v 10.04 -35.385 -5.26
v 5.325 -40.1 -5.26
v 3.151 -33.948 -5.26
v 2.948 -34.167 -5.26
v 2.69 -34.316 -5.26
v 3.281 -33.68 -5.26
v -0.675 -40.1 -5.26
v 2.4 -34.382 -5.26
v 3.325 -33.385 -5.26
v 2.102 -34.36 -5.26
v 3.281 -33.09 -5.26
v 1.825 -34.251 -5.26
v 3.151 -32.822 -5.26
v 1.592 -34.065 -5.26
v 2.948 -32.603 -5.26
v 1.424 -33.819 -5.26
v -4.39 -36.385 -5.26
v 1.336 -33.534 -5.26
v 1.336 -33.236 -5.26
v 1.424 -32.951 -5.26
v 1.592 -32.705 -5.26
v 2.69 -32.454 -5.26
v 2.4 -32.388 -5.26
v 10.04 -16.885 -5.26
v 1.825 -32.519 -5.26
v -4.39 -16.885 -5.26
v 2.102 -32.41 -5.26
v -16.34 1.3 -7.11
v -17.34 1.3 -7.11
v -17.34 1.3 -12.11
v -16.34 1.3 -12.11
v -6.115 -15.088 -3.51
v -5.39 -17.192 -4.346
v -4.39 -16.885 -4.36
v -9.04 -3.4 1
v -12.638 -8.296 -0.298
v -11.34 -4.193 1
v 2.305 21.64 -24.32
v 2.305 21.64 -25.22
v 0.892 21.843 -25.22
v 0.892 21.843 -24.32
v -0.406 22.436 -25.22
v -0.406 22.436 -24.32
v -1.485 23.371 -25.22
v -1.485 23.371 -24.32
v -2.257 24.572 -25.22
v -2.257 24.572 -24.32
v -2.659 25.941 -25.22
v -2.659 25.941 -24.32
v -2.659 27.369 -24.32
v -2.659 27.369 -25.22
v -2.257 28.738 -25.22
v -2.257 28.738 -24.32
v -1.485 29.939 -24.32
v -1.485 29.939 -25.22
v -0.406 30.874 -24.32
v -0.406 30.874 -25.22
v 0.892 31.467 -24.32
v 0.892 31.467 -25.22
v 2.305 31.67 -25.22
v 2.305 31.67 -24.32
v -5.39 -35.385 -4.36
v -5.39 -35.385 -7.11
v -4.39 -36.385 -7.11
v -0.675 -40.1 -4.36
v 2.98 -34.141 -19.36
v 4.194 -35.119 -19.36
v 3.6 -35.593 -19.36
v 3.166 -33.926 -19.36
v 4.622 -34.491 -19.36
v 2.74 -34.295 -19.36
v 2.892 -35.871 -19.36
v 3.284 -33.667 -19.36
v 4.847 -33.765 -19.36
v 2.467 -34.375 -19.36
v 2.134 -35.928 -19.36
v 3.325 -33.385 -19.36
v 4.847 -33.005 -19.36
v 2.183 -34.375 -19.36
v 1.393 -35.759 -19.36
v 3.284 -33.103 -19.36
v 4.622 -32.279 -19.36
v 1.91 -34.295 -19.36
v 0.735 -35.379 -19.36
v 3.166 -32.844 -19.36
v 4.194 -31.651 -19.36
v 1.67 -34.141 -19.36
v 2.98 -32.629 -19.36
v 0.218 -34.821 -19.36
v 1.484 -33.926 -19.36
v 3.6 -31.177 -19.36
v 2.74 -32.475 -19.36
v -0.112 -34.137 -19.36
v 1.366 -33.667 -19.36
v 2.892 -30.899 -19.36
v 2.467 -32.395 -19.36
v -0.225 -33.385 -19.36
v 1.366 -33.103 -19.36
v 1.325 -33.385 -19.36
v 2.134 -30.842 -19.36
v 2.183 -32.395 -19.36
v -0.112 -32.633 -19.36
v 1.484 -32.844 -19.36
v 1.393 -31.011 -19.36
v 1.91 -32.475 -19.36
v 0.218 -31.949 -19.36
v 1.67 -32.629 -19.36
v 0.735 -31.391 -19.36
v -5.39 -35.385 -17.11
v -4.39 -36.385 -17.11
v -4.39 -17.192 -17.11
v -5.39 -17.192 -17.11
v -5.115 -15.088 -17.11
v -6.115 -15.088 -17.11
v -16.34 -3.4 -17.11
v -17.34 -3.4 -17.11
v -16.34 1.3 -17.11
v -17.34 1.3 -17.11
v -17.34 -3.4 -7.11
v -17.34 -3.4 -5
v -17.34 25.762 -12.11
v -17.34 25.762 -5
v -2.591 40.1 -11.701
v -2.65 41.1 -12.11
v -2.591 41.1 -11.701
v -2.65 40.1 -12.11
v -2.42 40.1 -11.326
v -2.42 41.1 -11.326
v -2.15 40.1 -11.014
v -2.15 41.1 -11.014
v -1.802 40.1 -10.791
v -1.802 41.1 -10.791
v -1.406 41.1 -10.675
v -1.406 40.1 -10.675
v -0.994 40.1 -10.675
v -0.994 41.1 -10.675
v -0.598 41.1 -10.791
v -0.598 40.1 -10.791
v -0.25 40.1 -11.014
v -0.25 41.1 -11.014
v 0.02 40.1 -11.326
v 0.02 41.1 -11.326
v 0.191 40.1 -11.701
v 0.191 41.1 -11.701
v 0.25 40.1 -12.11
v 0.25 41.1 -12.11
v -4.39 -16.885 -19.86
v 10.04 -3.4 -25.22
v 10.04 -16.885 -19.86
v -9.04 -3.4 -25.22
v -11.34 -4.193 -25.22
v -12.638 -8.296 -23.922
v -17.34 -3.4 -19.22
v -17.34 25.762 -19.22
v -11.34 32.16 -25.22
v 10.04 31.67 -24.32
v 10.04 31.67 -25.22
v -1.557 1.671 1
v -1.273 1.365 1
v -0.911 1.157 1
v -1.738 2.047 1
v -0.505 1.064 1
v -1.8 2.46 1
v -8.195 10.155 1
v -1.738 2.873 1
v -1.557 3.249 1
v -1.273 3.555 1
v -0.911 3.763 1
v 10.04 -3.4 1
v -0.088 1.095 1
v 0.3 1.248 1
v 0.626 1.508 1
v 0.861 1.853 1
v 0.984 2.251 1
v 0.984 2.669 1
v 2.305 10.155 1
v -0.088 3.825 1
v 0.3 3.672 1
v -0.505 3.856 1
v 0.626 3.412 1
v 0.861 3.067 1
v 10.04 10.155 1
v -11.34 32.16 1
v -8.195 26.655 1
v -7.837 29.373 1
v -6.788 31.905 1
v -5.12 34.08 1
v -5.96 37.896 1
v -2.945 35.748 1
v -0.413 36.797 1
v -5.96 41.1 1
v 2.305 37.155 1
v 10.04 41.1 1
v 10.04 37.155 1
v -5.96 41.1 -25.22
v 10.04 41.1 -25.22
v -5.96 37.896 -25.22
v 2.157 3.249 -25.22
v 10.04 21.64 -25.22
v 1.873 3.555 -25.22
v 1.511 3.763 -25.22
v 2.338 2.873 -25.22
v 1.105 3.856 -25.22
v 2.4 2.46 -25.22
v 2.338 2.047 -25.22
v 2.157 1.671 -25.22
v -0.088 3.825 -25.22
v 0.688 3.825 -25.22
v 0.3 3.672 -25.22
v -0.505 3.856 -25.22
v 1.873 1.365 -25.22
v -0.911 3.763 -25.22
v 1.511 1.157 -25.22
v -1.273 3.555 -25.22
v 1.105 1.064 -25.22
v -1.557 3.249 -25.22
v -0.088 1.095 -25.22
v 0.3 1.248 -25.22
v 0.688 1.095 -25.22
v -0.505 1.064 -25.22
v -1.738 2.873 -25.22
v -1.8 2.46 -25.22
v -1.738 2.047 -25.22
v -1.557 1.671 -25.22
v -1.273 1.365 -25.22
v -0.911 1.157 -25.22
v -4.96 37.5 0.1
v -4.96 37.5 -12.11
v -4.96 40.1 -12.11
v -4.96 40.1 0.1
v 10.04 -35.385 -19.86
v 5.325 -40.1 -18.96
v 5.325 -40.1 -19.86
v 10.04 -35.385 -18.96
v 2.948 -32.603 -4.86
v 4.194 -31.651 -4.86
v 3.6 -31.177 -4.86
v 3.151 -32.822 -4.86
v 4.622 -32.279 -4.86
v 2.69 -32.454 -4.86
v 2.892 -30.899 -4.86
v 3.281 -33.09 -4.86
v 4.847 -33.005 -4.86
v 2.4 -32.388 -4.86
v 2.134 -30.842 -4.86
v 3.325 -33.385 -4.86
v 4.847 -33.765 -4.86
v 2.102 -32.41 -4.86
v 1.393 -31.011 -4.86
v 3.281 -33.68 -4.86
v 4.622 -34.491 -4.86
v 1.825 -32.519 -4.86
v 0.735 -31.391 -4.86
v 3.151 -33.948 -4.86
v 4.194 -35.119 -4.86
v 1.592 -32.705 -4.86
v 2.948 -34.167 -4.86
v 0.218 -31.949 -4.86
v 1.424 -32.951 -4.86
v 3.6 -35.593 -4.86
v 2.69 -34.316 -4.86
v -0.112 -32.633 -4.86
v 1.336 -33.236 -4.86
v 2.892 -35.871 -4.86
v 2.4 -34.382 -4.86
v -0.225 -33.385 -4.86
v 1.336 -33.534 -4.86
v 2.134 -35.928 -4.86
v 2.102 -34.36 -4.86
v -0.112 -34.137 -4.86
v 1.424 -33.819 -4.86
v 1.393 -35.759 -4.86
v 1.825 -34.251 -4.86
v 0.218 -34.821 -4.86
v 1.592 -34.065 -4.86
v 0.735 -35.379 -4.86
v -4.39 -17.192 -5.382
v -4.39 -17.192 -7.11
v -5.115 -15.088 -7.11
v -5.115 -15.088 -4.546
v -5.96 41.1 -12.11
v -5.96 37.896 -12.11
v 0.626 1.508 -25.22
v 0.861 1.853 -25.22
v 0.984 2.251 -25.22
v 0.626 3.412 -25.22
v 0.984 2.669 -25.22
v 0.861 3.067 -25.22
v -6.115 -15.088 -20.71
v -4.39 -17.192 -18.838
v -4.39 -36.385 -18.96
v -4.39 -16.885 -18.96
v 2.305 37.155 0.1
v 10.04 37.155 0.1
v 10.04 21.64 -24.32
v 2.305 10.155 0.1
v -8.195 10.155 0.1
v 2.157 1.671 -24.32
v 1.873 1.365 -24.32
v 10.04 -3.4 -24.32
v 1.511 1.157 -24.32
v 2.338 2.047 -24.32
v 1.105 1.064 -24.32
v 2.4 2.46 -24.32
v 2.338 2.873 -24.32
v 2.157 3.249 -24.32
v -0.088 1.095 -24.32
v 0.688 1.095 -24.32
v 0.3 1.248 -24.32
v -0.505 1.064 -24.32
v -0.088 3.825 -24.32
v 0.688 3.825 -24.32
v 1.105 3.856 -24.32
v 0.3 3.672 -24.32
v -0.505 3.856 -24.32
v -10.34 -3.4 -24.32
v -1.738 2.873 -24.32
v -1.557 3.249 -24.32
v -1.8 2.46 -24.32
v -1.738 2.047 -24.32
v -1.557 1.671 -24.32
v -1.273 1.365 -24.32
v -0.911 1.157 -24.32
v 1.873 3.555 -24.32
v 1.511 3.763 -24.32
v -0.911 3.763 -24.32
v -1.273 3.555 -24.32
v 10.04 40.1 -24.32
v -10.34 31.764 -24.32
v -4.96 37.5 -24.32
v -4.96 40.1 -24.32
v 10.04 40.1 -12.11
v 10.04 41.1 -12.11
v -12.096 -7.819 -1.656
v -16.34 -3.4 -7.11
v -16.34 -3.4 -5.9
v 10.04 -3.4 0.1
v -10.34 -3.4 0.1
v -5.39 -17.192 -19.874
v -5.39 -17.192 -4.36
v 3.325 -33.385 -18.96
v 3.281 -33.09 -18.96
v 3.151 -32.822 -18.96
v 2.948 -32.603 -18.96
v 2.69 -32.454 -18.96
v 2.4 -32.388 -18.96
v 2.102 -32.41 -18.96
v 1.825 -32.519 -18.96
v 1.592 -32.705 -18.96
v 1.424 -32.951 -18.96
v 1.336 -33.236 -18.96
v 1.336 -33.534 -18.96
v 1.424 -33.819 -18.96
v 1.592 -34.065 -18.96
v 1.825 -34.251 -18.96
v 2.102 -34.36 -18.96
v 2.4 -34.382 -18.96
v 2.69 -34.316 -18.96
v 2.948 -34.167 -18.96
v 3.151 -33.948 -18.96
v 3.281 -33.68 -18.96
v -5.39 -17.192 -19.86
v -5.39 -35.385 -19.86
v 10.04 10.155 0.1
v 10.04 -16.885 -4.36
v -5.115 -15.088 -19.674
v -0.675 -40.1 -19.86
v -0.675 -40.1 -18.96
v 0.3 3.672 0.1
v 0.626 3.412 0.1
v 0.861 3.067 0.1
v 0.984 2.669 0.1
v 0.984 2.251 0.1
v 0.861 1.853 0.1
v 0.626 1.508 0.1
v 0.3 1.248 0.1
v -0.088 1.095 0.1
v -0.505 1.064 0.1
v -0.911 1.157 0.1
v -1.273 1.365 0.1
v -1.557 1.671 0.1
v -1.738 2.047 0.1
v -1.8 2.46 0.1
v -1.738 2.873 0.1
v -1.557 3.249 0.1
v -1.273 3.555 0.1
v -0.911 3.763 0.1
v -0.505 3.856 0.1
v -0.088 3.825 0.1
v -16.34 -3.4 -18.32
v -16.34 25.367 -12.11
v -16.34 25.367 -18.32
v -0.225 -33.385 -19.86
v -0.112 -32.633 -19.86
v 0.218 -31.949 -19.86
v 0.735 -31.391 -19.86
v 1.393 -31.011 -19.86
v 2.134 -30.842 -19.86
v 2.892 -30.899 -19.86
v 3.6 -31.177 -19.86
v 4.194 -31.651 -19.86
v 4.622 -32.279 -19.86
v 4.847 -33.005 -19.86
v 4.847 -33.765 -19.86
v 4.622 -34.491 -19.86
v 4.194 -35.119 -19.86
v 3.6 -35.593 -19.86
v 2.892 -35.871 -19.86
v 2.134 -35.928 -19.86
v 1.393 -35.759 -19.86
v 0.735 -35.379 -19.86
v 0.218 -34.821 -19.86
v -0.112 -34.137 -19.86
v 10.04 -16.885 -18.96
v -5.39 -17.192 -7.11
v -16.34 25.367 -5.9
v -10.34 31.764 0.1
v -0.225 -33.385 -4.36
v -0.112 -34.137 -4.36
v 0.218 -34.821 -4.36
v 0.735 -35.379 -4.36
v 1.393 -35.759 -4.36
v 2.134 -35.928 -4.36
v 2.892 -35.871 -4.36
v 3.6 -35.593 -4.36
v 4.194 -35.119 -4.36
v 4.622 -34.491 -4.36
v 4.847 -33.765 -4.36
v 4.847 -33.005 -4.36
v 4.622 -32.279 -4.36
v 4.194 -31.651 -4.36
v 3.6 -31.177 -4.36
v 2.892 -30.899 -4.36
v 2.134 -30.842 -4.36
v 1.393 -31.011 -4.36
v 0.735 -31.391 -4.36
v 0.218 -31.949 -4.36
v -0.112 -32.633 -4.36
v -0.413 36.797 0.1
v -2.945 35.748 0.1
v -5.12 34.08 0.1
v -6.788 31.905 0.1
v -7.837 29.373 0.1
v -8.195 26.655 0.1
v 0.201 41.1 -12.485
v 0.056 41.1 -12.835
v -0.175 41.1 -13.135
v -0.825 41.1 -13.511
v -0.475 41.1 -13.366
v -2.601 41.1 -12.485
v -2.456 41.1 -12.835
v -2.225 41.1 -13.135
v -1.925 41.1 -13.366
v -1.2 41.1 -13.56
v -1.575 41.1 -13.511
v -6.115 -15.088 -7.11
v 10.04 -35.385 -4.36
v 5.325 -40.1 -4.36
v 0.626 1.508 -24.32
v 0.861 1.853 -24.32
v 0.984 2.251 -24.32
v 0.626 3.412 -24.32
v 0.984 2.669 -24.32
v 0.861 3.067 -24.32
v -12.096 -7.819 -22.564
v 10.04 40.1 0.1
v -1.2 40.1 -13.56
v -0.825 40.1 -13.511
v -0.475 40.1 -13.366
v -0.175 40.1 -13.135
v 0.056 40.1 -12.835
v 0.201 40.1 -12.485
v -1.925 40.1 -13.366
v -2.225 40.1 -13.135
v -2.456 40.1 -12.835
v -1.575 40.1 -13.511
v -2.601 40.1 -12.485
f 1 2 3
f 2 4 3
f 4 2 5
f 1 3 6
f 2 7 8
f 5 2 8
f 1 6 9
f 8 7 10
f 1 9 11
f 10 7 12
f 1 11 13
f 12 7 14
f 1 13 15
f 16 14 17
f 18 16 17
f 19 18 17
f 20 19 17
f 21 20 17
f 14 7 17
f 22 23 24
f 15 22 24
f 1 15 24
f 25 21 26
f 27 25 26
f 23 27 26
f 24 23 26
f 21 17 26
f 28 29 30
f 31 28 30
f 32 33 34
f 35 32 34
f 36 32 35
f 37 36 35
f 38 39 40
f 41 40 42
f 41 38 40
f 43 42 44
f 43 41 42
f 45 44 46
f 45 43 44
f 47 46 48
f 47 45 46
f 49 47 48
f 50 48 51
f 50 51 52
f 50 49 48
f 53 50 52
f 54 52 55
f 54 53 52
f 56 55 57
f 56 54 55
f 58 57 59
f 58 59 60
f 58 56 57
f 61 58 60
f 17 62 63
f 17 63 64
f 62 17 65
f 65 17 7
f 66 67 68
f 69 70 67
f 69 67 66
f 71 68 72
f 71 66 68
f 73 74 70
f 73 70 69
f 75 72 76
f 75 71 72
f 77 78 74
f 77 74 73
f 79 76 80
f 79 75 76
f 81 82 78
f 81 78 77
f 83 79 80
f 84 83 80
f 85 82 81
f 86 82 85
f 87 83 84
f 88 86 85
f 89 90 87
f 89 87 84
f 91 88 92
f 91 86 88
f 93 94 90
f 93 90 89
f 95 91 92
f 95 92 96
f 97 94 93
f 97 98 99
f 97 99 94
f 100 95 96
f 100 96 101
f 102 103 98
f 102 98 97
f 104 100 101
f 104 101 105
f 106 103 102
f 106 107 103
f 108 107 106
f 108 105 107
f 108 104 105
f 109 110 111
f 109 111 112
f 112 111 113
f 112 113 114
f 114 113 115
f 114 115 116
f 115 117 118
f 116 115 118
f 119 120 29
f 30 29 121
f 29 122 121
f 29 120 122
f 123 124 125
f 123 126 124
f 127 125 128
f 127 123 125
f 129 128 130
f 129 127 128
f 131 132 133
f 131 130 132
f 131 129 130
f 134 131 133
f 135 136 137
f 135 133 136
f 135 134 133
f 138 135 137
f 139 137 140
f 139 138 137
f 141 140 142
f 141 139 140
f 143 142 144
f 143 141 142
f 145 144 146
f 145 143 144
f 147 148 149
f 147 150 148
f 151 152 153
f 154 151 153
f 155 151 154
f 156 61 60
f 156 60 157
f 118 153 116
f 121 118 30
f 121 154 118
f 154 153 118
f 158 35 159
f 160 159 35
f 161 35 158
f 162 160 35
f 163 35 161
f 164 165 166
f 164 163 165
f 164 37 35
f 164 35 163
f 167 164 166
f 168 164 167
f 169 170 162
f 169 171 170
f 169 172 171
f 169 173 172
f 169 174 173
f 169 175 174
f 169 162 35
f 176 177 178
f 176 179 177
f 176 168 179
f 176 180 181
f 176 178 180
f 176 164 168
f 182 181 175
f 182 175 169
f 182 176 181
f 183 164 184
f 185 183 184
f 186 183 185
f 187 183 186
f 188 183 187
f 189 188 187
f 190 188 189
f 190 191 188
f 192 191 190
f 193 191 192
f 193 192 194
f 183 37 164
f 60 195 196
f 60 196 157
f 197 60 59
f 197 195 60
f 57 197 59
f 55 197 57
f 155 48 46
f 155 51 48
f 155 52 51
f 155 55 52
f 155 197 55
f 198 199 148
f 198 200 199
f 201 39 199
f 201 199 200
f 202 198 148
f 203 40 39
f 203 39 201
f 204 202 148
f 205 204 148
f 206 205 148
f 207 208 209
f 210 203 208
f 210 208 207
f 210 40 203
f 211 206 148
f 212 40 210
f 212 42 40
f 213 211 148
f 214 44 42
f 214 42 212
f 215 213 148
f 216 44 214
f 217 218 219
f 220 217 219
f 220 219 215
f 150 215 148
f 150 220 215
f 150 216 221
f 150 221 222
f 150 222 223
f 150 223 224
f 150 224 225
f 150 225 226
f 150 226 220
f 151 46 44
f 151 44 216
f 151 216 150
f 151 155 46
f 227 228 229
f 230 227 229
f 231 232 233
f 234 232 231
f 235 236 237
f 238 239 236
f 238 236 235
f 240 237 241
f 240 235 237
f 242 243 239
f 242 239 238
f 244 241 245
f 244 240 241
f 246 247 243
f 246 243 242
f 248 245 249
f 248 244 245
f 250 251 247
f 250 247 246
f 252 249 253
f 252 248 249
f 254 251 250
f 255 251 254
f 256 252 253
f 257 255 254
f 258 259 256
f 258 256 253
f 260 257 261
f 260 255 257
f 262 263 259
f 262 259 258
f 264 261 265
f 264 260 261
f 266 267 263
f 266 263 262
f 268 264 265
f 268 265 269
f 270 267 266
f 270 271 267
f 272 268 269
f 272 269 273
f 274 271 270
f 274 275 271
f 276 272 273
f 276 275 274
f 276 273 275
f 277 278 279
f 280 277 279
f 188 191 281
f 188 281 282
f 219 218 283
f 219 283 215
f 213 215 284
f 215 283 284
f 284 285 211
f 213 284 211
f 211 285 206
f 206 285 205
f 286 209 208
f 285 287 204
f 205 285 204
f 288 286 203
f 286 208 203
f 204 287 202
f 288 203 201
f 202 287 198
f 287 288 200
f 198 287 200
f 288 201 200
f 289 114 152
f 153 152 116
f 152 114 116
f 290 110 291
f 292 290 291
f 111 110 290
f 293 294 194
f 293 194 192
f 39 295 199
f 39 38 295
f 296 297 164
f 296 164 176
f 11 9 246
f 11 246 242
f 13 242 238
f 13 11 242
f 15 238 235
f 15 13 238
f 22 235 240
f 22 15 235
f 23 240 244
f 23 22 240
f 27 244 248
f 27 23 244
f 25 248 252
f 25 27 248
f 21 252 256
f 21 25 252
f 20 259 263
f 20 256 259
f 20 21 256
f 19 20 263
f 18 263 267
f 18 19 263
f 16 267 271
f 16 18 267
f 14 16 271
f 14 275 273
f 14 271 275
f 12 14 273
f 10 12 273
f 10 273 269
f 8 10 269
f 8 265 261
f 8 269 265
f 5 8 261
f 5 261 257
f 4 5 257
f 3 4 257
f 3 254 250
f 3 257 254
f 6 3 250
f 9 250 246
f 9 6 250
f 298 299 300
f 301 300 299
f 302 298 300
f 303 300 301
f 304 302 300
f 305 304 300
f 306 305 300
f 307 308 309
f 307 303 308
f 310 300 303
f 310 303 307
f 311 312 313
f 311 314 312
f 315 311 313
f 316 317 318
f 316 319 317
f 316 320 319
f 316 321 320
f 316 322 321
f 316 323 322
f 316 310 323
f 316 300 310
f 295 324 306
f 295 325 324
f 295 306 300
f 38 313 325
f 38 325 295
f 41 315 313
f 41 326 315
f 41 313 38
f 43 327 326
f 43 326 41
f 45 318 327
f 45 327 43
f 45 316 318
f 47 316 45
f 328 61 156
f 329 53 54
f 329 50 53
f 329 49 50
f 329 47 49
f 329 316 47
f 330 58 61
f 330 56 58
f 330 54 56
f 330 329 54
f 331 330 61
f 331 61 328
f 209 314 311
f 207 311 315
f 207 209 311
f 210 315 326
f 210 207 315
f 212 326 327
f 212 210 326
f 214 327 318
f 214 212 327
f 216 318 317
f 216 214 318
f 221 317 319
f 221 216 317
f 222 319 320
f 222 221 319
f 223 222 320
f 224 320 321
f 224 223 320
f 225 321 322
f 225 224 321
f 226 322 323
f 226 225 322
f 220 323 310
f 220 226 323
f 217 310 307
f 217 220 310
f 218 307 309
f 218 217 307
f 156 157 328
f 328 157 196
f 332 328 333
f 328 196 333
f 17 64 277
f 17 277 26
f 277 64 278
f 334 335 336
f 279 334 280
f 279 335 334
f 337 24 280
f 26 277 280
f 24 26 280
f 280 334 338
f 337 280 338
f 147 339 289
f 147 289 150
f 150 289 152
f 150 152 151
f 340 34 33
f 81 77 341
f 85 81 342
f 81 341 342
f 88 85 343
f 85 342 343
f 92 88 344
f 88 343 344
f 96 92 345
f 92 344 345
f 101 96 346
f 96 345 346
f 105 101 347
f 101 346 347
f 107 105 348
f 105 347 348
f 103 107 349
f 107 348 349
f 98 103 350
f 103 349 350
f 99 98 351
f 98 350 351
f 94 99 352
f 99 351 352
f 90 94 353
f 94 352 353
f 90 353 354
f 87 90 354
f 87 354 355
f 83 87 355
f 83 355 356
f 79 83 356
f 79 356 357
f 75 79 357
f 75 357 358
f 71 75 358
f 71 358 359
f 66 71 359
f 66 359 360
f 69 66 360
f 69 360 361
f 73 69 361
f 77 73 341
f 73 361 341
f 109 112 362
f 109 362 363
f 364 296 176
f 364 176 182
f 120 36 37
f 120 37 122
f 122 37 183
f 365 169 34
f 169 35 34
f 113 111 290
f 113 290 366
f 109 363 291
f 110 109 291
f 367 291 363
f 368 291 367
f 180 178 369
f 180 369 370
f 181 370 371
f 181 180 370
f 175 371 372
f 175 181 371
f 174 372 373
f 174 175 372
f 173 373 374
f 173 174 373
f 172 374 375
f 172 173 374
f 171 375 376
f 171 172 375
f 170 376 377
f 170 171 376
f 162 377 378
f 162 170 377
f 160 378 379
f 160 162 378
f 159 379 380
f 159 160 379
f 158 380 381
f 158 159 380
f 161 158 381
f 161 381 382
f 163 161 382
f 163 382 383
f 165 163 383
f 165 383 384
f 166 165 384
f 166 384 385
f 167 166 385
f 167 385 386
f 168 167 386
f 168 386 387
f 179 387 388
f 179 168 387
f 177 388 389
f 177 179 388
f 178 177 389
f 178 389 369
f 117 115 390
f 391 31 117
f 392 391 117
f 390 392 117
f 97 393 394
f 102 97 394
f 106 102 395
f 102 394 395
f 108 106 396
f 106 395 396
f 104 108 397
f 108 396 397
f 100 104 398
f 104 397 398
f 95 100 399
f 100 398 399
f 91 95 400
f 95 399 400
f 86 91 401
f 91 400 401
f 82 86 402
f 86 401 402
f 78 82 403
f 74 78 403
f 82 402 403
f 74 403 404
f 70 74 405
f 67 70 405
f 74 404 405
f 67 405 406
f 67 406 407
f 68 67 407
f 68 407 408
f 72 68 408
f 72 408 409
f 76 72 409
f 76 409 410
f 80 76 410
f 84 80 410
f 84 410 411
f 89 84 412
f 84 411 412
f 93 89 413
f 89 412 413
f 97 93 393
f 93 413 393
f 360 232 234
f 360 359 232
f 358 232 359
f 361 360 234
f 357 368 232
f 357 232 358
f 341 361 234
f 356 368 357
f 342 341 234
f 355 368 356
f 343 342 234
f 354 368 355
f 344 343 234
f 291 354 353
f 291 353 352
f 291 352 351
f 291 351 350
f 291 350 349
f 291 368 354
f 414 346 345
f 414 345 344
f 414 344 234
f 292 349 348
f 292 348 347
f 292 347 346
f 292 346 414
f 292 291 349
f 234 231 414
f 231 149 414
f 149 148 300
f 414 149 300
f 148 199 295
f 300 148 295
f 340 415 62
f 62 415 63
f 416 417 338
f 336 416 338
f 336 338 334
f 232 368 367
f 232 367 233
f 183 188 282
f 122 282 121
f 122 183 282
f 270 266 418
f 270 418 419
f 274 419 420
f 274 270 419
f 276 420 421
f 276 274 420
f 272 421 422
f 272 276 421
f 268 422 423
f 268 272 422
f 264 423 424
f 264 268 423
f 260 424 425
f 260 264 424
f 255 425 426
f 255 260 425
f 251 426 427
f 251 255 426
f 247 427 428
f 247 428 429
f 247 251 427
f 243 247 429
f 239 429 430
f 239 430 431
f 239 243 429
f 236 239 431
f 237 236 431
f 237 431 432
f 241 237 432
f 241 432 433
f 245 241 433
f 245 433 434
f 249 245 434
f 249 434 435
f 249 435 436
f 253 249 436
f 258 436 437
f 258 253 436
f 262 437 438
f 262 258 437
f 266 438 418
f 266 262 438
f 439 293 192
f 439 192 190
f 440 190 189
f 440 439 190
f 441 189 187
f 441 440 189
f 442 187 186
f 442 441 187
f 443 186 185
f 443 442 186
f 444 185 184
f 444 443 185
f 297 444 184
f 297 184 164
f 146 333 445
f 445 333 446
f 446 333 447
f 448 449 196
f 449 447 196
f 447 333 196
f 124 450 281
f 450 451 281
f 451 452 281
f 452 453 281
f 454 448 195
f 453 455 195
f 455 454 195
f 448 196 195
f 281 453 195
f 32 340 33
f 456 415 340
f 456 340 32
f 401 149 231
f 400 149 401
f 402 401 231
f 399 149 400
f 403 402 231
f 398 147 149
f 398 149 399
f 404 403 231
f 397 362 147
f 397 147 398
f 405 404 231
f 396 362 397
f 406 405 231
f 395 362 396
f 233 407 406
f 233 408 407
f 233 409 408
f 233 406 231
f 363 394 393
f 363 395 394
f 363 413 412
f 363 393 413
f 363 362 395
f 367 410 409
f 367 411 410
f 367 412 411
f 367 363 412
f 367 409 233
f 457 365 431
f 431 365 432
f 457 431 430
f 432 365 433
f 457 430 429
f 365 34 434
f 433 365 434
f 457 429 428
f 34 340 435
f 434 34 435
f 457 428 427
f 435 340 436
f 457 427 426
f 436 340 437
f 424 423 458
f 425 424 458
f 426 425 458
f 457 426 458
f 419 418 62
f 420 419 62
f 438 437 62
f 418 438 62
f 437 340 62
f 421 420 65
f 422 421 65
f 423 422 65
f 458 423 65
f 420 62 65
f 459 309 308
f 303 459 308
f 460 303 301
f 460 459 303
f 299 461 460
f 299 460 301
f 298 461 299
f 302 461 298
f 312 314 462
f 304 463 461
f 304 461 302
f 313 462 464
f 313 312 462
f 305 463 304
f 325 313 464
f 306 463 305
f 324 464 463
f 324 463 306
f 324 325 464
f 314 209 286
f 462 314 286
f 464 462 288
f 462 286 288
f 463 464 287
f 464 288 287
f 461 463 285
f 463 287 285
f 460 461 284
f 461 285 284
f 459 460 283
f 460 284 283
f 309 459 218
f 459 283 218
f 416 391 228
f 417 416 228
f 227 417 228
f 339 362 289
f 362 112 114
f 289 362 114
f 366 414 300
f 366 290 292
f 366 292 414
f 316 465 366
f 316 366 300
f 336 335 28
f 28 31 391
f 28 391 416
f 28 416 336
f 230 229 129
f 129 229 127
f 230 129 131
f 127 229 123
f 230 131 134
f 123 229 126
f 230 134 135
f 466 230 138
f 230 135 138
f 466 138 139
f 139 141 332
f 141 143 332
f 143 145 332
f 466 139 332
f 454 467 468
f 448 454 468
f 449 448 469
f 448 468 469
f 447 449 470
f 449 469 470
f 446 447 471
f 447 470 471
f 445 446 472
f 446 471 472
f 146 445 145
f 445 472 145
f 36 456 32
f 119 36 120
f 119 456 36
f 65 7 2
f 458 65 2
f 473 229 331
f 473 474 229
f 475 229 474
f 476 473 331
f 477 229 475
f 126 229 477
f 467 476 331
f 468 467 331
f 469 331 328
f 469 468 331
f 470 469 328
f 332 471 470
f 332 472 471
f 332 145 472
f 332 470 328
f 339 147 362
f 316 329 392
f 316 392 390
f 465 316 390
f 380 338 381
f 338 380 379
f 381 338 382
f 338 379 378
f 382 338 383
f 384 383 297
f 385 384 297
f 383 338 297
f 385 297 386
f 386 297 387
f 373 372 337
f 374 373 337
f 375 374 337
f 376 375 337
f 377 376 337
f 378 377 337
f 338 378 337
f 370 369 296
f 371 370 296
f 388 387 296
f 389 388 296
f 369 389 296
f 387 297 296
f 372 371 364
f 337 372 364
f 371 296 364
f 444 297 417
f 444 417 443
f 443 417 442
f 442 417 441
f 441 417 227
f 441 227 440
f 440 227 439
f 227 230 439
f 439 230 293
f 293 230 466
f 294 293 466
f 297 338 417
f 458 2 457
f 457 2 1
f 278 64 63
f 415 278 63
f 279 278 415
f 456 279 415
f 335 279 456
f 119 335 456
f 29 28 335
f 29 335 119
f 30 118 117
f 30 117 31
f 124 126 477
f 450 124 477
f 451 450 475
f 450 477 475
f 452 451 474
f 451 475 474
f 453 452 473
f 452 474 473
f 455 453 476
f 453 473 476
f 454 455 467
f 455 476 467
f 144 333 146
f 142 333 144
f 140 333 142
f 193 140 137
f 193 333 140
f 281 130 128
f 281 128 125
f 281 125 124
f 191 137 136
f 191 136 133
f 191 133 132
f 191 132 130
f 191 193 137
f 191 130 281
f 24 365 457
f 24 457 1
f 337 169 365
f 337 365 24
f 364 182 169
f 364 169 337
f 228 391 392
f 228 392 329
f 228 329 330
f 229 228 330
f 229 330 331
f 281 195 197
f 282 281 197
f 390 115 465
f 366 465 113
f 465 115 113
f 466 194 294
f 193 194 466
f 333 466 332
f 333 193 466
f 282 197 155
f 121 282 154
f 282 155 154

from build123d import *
from build123d.topology import SkipClean

# Parameters (mm, degrees)
EXTRUDE_1_DEPTH      = 1
SKETCH_2_W           = 14.000000000000007
SKETCH_2_H           = 24.219999999999995
SKETCH_2_R           = 1.45
SKETCH_2_H_2         = 1
EXTRUDE_2_DEPTH      = 1
SKETCH_3_R           = 1.4
CUT_EXTRUDE_1_DEPTH  = 50.06098246060713
EXTRUDE_3_DEPTH      = 25.22
EXTRUDE_4_DEPTH      = 1
CUT_EXTRUDE_2_DEPTH  = 0.1
EXTRUDE_5_REACH      = 56.514
EXTRUDE_6_DEPTH      = 4.7
EXTRUDE_7_DEPTH      = 6.26
CUT_EXTRUDE_3_DEPTH  = 54.61414092494707
CUT_EXTRUDE_4_REACH  = 50.47
EXTRUDE_8_REACH      = 53.244
CUT_EXTRUDE_6_DEPTH  = 0.721269738
SKETCH_15_R          = 1.000000000000005
EXTRUDE_9_DEPTH      = 1
EXTRUDE_START        = -1
EXTRUDE_10_DEPTH     = 1
CUT_EXTRUDE_7_DEPTH  = 0.1
CUT_EXTRUDE_10_REACH = 56.514
CUT_EXTRUDE_12_DEPTH = 51.10000000000001
EXTRUDE_START_2      = -2.75
EXTRUDE_11_DEPTH     = 2.75
CUT_EXTRUDE_13_REACH = 49.777
CUT_EXTRUDE_14_REACH = 49.777
EXTRUDE_12_DEPTH     = 2.75
EXTRUDE_13_REACH     = 50.829
CUT_EXTRUDE_15_REACH = 49.777
EXTRUDE_START_3      = -2.81831
EXTRUDE_14_DEPTH     = 2.81831
CUT_EXTRUDE_START    = -0.75
CUT_EXTRUDE_16_DEPTH = 0.75
CHAMFER_1_SIZE       = 0.8
CHAMFER_3_SIZE       = 6
EXTRUDE_15_DEPTH     = 1
EXTRUDE_16_DEPTH     = 1
CUT_EXTRUDE_17_DEPTH = 1
SKETCH_36_R          = 1.4000000000000001
CUT_EXTRUDE_18_DEPTH = 1
EXTRUDE_17_DEPTH     = 0.9
CUT_EXTRUDE_START_2  = -12.11
SKETCH_40_W          = 89.84282301383726
SKETCH_40_H          = 107.72029223205328
CUT_EXTRUDE_20_DEPTH = 12.11
CUT_EXTRUDE_22_DEPTH = 13.11
SKETCH_42_R          = 2.549999999999999
SKETCH_42_R_2        = 1.000000000000005
CUT_EXTRUDE_23_DEPTH = 0.5
CUT_EXTRUDE_START_3  = -0.5
SKETCH_43_R          = 2.549999999999998
CUT_EXTRUDE_24_DEPTH = 0.5


with BuildPart() as part:
    # 草图1 → 凸台-拉伸1 (new body)
    with BuildSketch(Plane.XY):
        with BuildLine():
            ThreePointArc((2.305000000000004, 21.64000000000001), (-2.7099999999999955, 26.655000000000012), (2.3050000000000055, 31.670000000000012))
            Line((2.305000000000005, 31.670000000000012), (9.040000000000003, 31.670000000000012))
            Line((9.040000000000003, 31.670000000000012), (9.040000000000003, 40.10000000000001))
            Line((9.040000000000003, 40.10000000000001), (-4.960000000000004, 40.10000000000001))
            Line((-4.960000000000004, 40.10000000000001), (-4.960000000000003, 37.50000000000002))
            Line((-4.960000000000003, 37.50000000000002), (-9.039999999999996, 33.15000000000001))
            Line((-9.039999999999996, 33.15000000000001), (-9.04, -3.3999999999999915))
            Line((-9.04, -3.3999999999999932), (9.040000000000003, -3.3999999999999932))
            Line((9.040000000000003, -3.3999999999999932), (9.040000000000003, 6.670384958363659))
            Line((9.040000000000003, 6.670384958363659), (9.040000000000003, 21.640000000000015))
            Line((9.040000000000003, 21.640000000000015), (2.305000000000005, 21.640000000000015))
        make_face()
    extrude(amount=EXTRUDE_1_DEPTH)

    # 草图2 → 凸台-拉伸2 (add)
    # profile 1 of 2: a face of its own
    with BuildSketch(Plane(origin=(0, 40.10000000000001, 0), x_dir=(1, 0, 0), z_dir=(0, 1, 0))):
        with Locations((2.039999999999999, 12.109999999999998)):
            Rectangle(SKETCH_2_W, SKETCH_2_H)
        with Locations(Location((-1.1999999999999935, 12.11, 0), (0, 0, 270))):
            Circle(SKETCH_2_R, mode=Mode.SUBTRACT)
    # profile 2 of 2: a face of its own
    with BuildSketch(Plane(origin=(0, 40.10000000000001, 0), x_dir=(1, 0, 0), z_dir=(0, 1, 0))):
        with Locations((2.039999999999999, -0.5)):
            Rectangle(SKETCH_2_W, SKETCH_2_H_2)
    extrude(amount=EXTRUDE_2_DEPTH)

    # 草图3 → 切除-拉伸1 (cut, through all)
    with BuildSketch(Plane.XY.offset(1)):
        with Locations((0.9999999999999981, 2.460000000000012)):
            Circle(SKETCH_3_R)
    extrude(amount=-CUT_EXTRUDE_1_DEPTH, mode=Mode.SUBTRACT)

    # 草图4 → 凸台-拉伸3 (add)
    with BuildSketch(Plane.XY.offset(1)):
        Polygon((-15.939999999999996, 25.793382352941165), (-15.939999999999996, 27.255138921743242), (-17.339999999999993, 25.762491862919703), (-17.339999999999996, 24.30073529411763), (-16.33999999999999, 25.366911764705875), align=None)
        Polygon((-16.33999999999999, 25.366911764705875), (-17.339999999999996, 24.30073529411763), (-17.339999999999996, 24.20000000000001), (-17.339999999999993, 1.3000000000000078), (-16.339999999999996, 1.3000000000000096), (-16.339999999999996, 24.20000000000001), align=None)
        Polygon((-4.960000000000004, 41.10000000000001), (-5.960000000000004, 41.10000000000001), (-5.960000000000004, 37.89558009821385), (-9.769380317724162, 33.834108435934404), (-15.93999999999999, 27.25513892174324), (-15.939999999999996, 25.793382352941165), (-9.039999999999996, 33.15000000000001), (-4.960000000000003, 37.50000000000002), align=None)
    extrude(amount=-EXTRUDE_3_DEPTH)

    # 草图5 → 凸台-拉伸4 (add)
    with BuildSketch(Plane.XY.offset(1)):
        Polygon((-16.339999999999993, 25.36691176470587), (-16.339999999999996, 1.3000000000000096), (-9.039999999999997, 1.3000000000000165), (-9.039999999999994, 33.15000000000001), align=None)
    extrude(amount=-EXTRUDE_4_DEPTH)

    # 草图6 → 切除-拉伸2 (cut)
    with BuildSketch(Plane(origin=(0, 0, 0), x_dir=(-1, 0, 0), z_dir=(0, 0, -1))):
        with BuildLine():
            Line((-2.305000000000006, 21.640000000000015), (-9.040000000000003, 21.640000000000015))
            Line((-9.040000000000003, 21.640000000000015), (-9.040000000000003, -3.3999999999999932))
            Line((-9.040000000000003, -3.3999999999999932), (9.04, -3.3999999999999932))
            Line((9.04, -3.3999999999999932), (9.04, 1.300000000000013))
            Line((9.04, 1.300000000000013), (16.339999999999996, 1.3000000000000096))
            Line((16.339999999999996, 1.3000000000000096), (16.339999999999993, 25.36691176470587))
            Line((16.339999999999993, 25.36691176470587), (4.959999999999999, 37.50000000000002))
            Line((4.959999999999999, 37.50000000000002), (4.960000000000004, 40.10000000000001))
            Line((4.960000000000004, 40.10000000000001), (-9.040000000000003, 40.10000000000001))
            Line((-9.040000000000003, 40.10000000000001), (-9.040000000000003, 31.670000000000012))
            Line((-9.040000000000003, 31.670000000000012), (-2.3050000000000046, 31.670000000000012))
            ThreePointArc((-2.3050000000000046, 31.670000000000012), (2.709999999999992, 26.655000000000012), (-2.305000000000006, 21.640000000000015))
        make_face()
    extrude(amount=-CUT_EXTRUDE_2_DEPTH, mode=Mode.SUBTRACT)

    # 凸台-拉伸5: up to this plane
    extrude_5_end = Plane(origin=(-9.127141339001065, -3.147290116896902, 0), z_dir=(0.9453729816262727, 0.3259906833194027, 0))
    # 草图7 → 凸台-拉伸5 (add, up to the surface)
    with BuildSketch(Plane(origin=(9.040000000000003, 0, 0), x_dir=(0, 0, -1), z_dir=(1, 0, 0)), mode=Mode.PRIVATE) as extrude_5_sk1:
        Polygon((-1, -3.3999999999999932), (4.359999999999999, -16.885), (5.26, -16.885), (-0.1, -3.3999999999999932), align=None)
    extrude_5_tool1 = split(extrude(extrude_5_sk1.sketch, amount=-EXTRUDE_5_REACH, mode=Mode.PRIVATE), bisect_by=extrude_5_end, keep=Keep.BOTH, mode=Mode.PRIVATE)
    add(extrude_5_tool1.solids().sort_by_distance((9.04, -10.1425, -2.13))[0])

    # 草图8 → 凸台-拉伸6 (add)
    with BuildSketch(Plane.XZ.offset(-1.300000000000013)):
        Polygon((-16.339999999999996, -24.22), (-16.339999999999996, 0.1), (-9.04, 0.10000000000000286), (-9.04, 1), (-17.339999999999993, 1), (-17.340000000000046, -24.22), align=None)
    extrude(amount=EXTRUDE_6_DEPTH)

    # 草图9 → 凸台-拉伸7 (add)
    with BuildSketch(Plane.XY.offset(1)):
        Polygon((-17.339999999999993, -3.399999999999995), (-4.390000000000023, -16.885), (-9.039999999999997, -3.3999999999999932), align=None)
    extrude(amount=-EXTRUDE_7_DEPTH)

    # 草图10 → 切除-拉伸3 (cut, through all)
    with BuildSketch(Plane(origin=(-9.127141339001064, -3.1472901168968996, 0), x_dir=(0, 0, -1), z_dir=(0.9453729816262728, 0.3259906833194025, 0))):
        Polygon((-1, -14.531523694987438), (4.359999999999999, -14.531523694987433), (-1, -0.2673123603219238), align=None)
    extrude(amount=-CUT_EXTRUDE_3_DEPTH, mode=Mode.SUBTRACT)

    # 切除-拉伸4: up to this face of the body (flat: up to its plane)
    cut_extrude_4_end = Plane(part.part.faces().sort_by_distance((1.105315773, -9.810831482, -2.448168835))[0])
    # 草图11 → 切除-拉伸4 (cut, up to the picked face)
    with BuildSketch(Plane(origin=(0, 0, -5.260000000000001), x_dir=(-1, 0, 0), z_dir=(0, 0, -1)), mode=Mode.PRIVATE) as cut_extrude_4_sk1:
        Polygon((4.390000000000023, -16.885000000000005), (17.340000000000007, -3.399999999999995), (16.339999999999996, -3.399999999999995), (9.039999999999997, -3.3999999999999932), align=None)
    cut_extrude_4_tool1 = split(extrude(cut_extrude_4_sk1.sketch, amount=-CUT_EXTRUDE_4_REACH, mode=Mode.PRIVATE), bisect_by=cut_extrude_4_end, keep=Keep.BOTH, mode=Mode.PRIVATE)
    add(cut_extrude_4_tool1.solids().sort_by(Axis((-10.256667, -7.895, -5.26), (0, 0, 1)))[0], mode=Mode.SUBTRACT)

    # 凸台-拉伸8: up to this face of the body (flat: up to its plane)
    extrude_8_end = Plane(part.part.faces().sort_by_distance((-9.568408076, -8.61169244, -0.786666667))[0])
    # 草图13 → 凸台-拉伸8 (add, up to the picked face)
    with BuildSketch(Plane(origin=(0, 0, -24.22), x_dir=(-1, 0, 0), z_dir=(0, 0, -1)), mode=Mode.PRIVATE) as extrude_8_sk1:
        Polygon((17.340000000000007, -3.399999999999997), (16.339999999999996, -3.399999999999995), (3.390000000000013, -16.885000000000005), (4.390000000000022, -16.885000000000005), align=None)
    extrude_8_tool1 = split(extrude(extrude_8_sk1.sketch, amount=-EXTRUDE_8_REACH, mode=Mode.PRIVATE), bisect_by=extrude_8_end, keep=Keep.BOTH, mode=Mode.PRIVATE)
    add(extrude_8_tool1.solids().sort_by(Axis((-10.365, -10.1425, -24.22), (0, 0, 1)))[0])

    # 草图14 → 切除-拉伸6 (cut)
    with BuildSketch(Plane(origin=(-10.199166727519122, -9.79452792891156, 0), x_dir=(0, 0, -1), z_dir=(0.7212697376131842, 0.6926542901068385, 0))):
        Polygon((-1, 9.558308282567797), (-2.0167175162547317, 9.558308282567797), (-1.8942214299589746, 8.865653992460917), (-1, 8.865653992460917), align=None)
        Polygon((-1, 8.865653992460917), (-1.8942214299589746, 8.865653992460917), (-1, 6.243844479321156), align=None)
    extrude(amount=-CUT_EXTRUDE_6_DEPTH, mode=Mode.SUBTRACT)

    # 草图15 → 凸台-拉伸9 (add)
    with BuildSketch(Plane.XY.offset(-5.36)):
        with BuildLine():
            Line((9.040000000000003, -33.385), (9.040000000000003, -16.885))
            Line((9.040000000000003, -16.885), (-4.390000000000019, -16.885000000000005))
            Line((-4.390000000000019, -16.885000000000005), (-4.390000000000003, -33.385))
            ThreePointArc((-4.390000000000003, -33.385), (2.324999999999993, -40.099999999999994), (9.040000000000003, -33.385))
        make_face()
        with Locations((2.3249999999998776, -33.3850000000001)):
            Circle(SKETCH_15_R, mode=Mode.SUBTRACT)
    extrude(amount=EXTRUDE_9_DEPTH)

    # 草图16 → 凸台-拉伸10 (add)
    with BuildSketch(Plane.XY.offset(-4.359999999999999).offset(EXTRUDE_START)):
        with BuildLine():
            Line((-4.390000000000003, -36.385), (-0.6750000000000043, -40.1))
            Line((-0.6750000000000042, -40.1), (2.32499999999999, -40.1))
            ThreePointArc((2.32499999999999, -40.1), (-2.423222035667676, -38.133222035667664), (-4.390000000000009, -33.385))
            Line((-4.390000000000009, -33.385), (-4.390000000000003, -36.385))
        make_face()
        with BuildLine():
            ThreePointArc((9.04, -33.385), (7.073222035667661, -38.13322203566767), (2.32499999999999, -40.1))
            Line((2.32499999999999, -40.1), (5.324999999999997, -40.1))
            Line((5.324999999999997, -40.1), (9.039999999999996, -36.385))
            Line((9.039999999999996, -36.385), (9.039999999999997, -33.385))
        make_face()
    extrude(amount=EXTRUDE_10_DEPTH)

    # 草图17 → 切除-拉伸7 (cut)
    with BuildSketch(Plane(origin=(0, 0, -5.36), x_dir=(-1, 0, 0), z_dir=(0, 0, -1))):
        Polygon((-5.324999999999997, -40.1), (0.6750000000000042, -40.1), (4.390000000000003, -36.385), (4.390000000000023, -16.885), (3.3900000000000112, -16.885000000000005), (-9.040000000000003, -16.885), (-9.039999999999996, -36.385), align=None)
    extrude(amount=-CUT_EXTRUDE_7_DEPTH, mode=Mode.SUBTRACT)

    # 切除-拉伸10: up to this face of the body (flat: up to its plane)
    cut_extrude_10_end = Plane(part.part.faces().sort_by_distance((-10.132298213, -9.864158965, -13.344682686))[0])
    # 草图18 → 切除-拉伸10 (cut, up to the picked face)
    with BuildSketch(Plane.ZY.offset(17.34000000000005), mode=Mode.PRIVATE) as cut_extrude_10_sk1:
        Polygon((-18.86, -16.885), (-24.22, -3.3999999999999932), (-24.22, -16.885000000000016), align=None)
    cut_extrude_10_tool1 = split(extrude(cut_extrude_10_sk1.sketch, amount=-CUT_EXTRUDE_10_REACH, mode=Mode.PRIVATE), bisect_by=cut_extrude_10_end, keep=Keep.BOTH, mode=Mode.PRIVATE)
    add(cut_extrude_10_tool1.solids().sort_by(Axis((-17.34, -12.39, -22.433333), (1, -2.22e-15, 0)))[0], mode=Mode.SUBTRACT)

    # 草图20 → 切除-拉伸12 (cut)
    with BuildSketch(Plane.ZY.offset(17.34000000000005)):
        Polygon((-7.109999999999996, -3.4000000000000106), (-16.109999999999996, -3.400000000000023), (-16.109999999999992, -16.885000000000012), (-7.109999999999994, -16.885000000000012), align=None)
        Polygon((-7.109999999999994, -16.885000000000012), (-16.109999999999996, -16.885000000000005), (-16.109999999999992, -19.987970333282604), (-7.109999999999992, -19.987970333282604), align=None)
        Polygon((-14.919999999999998, 1.3000000000000096), (-16.109999999999996, 1.3000000000000096), (-16.109999999999996, -3.400000000000033), (-7.109999999999996, -3.4000000000000106), (-7.109999999999997, 1.3000000000000107), align=None)
    extrude(amount=-CUT_EXTRUDE_12_DEPTH, mode=Mode.SUBTRACT)

    # 草图22 → 凸台-拉伸11 (add)
    with BuildSketch(Plane.XY.offset(-4.359999999999999).offset(EXTRUDE_START_2)):
        Polygon((-5.390000000000022, -15.843687258687254), (-5.390000000000019, -16.885000000000005), (-5.3900000000000166, -35.384999999999984), (-4.390000000000003, -36.385), (-4.390000000000019, -16.885000000000005), align=None)
    extrude(amount=EXTRUDE_11_DEPTH)

    # 切除-拉伸13: up to this plane
    cut_extrude_13_end = Plane(origin=(-22.011711829773798, -0.4982010551356256, 1.2534032142731184), z_dir=(0, -0.36936995412553747, 0.9292824312281485))
    # 草图23 → 切除-拉伸13 (cut, up to the surface)
    with BuildSketch(Plane(origin=(0, -1.16e-15, -7.109999999999997), x_dir=(-1, 0, 0), z_dir=(0, -1.6e-16, -1)), mode=Mode.PRIVATE) as cut_extrude_13_sk1:
        Polygon((3.3900000000000112, -16.88499999999999), (4.390000000000031, -16.884999999999987), (4.950240963855443, -15.260301204819266), align=None)
    cut_extrude_13_tool1 = split(extrude(cut_extrude_13_sk1.sketch, amount=-CUT_EXTRUDE_13_REACH, mode=Mode.PRIVATE), bisect_by=cut_extrude_13_end, keep=Keep.BOTH, mode=Mode.PRIVATE)
    add(cut_extrude_13_tool1.solids().sort_by_distance((-4.243414, -16.343434, -7.11))[0], mode=Mode.SUBTRACT)

    # 切除-拉伸14: up to this plane
    cut_extrude_14_end = Plane(origin=(-22.011711829773798, -0.4982010551356256, 1.2534032142731184), z_dir=(0, -0.36936995412553747, 0.9292824312281485))
    # 草图25 → 切除-拉伸14 (cut, up to the surface)
    with BuildSketch(Plane(origin=(0, -1.16e-15, -7.109999999999997), x_dir=(-1, 0, 0), z_dir=(0, -1.6e-16, -1)), mode=Mode.PRIVATE) as cut_extrude_14_sk1:
        Polygon((4.484537298162646, -16.917599068331942), (5.044778262018067, -15.292900273151215), (5.115280688300644, -15.088443236931736), (4.950240963855439, -15.260301204819275), (4.390000000000019, -16.885000000000005), (4.390000000000019, -17.191757233003564), align=None)
    cut_extrude_14_tool1 = split(extrude(cut_extrude_14_sk1.sketch, amount=-CUT_EXTRUDE_14_REACH, mode=Mode.PRIVATE), bisect_by=cut_extrude_14_end, keep=Keep.BOTH, mode=Mode.PRIVATE)
    add(cut_extrude_14_tool1.solids().sort_by_distance((-4.713146, -16.107819, -7.11))[0], mode=Mode.SUBTRACT)

    # 草图26 → 凸台-拉伸12 (add)
    with BuildSketch(Plane(origin=(0, -1.16e-15, -7.109999999999997), x_dir=(-1, 0, 0), z_dir=(0, -1.6e-16, -1))):
        Polygon((5.390000000000022, -15.843687258687257), (5.390000000000022, -17.191757233003564), (6.115280688300655, -15.088443236931735), align=None)
    extrude(amount=-EXTRUDE_12_DEPTH)

    # 凸台-拉伸13: up to this face of the body (flat: up to its plane)
    extrude_13_end = Plane(part.part.faces().sort_by_distance((-9.568408076, -8.61169244, -0.786666667))[0])
    # 草图27 → 凸台-拉伸13 (add, up to the picked face)
    with BuildSketch(Plane.XY.offset(-4.359999999999999), mode=Mode.PRIVATE) as extrude_13_sk1:
        Polygon((-4.390000000000019, -16.885000000000005), (-5.390000000000021, -17.19175723300357), (-6.115280688300651, -15.088443236931742), align=None)
    extrude_13_tool1 = split(extrude(extrude_13_sk1.sketch, amount=EXTRUDE_13_REACH, mode=Mode.PRIVATE), bisect_by=extrude_13_end, keep=Keep.BOTH, mode=Mode.PRIVATE)
    add(extrude_13_tool1.solids().sort_by(Axis((-5.298427, -16.3884, -4.36), (0, 0, 1)))[0])

    # 切除-拉伸15: up to this plane
    cut_extrude_15_end = Plane(origin=(7.450077950019115, -8.77736715203255, -22.08261120245499), z_dir=(0, -0.36936995412553747, -0.9292824312281485))
    # 草图28 → 切除-拉伸15 (cut, up to the surface)
    with BuildSketch(Plane.XY.offset(-16.109999999999996), mode=Mode.PRIVATE) as cut_extrude_15_sk1:
        Polygon((-5.115280688300643, -15.088443236931733), (-4.555039724445227, -16.71314203211245), (-4.390000000000022, -16.884999999999998), (-3.3900000000000103, -16.885000000000005), align=None)
    cut_extrude_15_tool1 = split(extrude(cut_extrude_15_sk1.sketch, amount=-CUT_EXTRUDE_15_REACH, mode=Mode.PRIVATE), bisect_by=cut_extrude_15_end, keep=Keep.BOTH, mode=Mode.PRIVATE)
    add(cut_extrude_15_tool1.solids().sort_by_distance((-4.332333, -16.281146, -16.11))[0], mode=Mode.SUBTRACT)

    # 草图29 → 凸台-拉伸14 (add)
    with BuildSketch(Plane.XY.offset(-16.109999999999996).offset(EXTRUDE_START_3)):
        Polygon((-4.390000000000019, -17.19175723300356), (-4.555039724445218, -16.71314203211248), (-6.115280688300654, -15.088443236931742), (-5.390000000000018, -17.191757233003575), (-5.3900000000000166, -35.384999999999984), (-4.389999999999998, -36.38500000000001), align=None)
    extrude(amount=EXTRUDE_14_DEPTH)

    # 草图30 → 切除-拉伸16 (cut)
    with BuildSketch(Plane.XY.offset(-16.109999999999996).offset(CUT_EXTRUDE_START)):
        Polygon((-6.115280688300638, -15.088443236931745), (-5.1152806883006665, -15.088443236931706), (-4.390000000000019, -17.191757233003564), (-4.389999999999998, -36.38500000000001), (-5.3900000000000166, -35.384999999999984), (-5.390000000000017, -17.191757233003575), align=None)
    extrude(amount=CUT_EXTRUDE_16_DEPTH, mode=Mode.SUBTRACT)

    # 倒角1
    # the kernel refuses this chamfer: 0.8 mm, written as the material it takes off along each edge
    with BuildSketch(Plane(origin=(-8.17262707867337, -15.088443236931827, -16.109999999999992), x_dir=(-3.906507503623607e-14, 0.9996219169112966, 0.027495876610587302), z_dir=(1, 3.908e-14, 0))) as chamfer_1_piece_1_section:
        Polygon((CHAMFER_1_SIZE * 0.999621916911, -CHAMFER_1_SIZE * 0.0274958766106), (-CHAMFER_1_SIZE * 0.0274958766106, -CHAMFER_1_SIZE * 0.999621916911), (0, 0), align=None)
    chamfer_1_piece_1 = extrude(amount=5.114692780745436, mode=Mode.PRIVATE)
    chamfer_1_piece_1 = split(chamfer_1_piece_1, bisect_by=Plane(origin=(-5.615280688300567, -14.821822785366846, -16.859999999999996), z_dir=(0, 0, 1)), keep=Keep.TOP, mode=Mode.PRIVATE)
    add(chamfer_1_piece_1, mode=Mode.SUBTRACT)

    # 倒角3
    chamfer_3_edges = [part.edges().sort_by_distance(p)[0] for p in [
        (-17.339999999999993, 11.181245931459856, 1),
        (-16.339999999999996, 10.983455882352938, 0.1),
    ]]
    chamfer(chamfer_3_edges, length=CHAMFER_3_SIZE)

    # 草图32 → 凸台-拉伸15 (add)
    with BuildSketch(Plane(origin=(0, 0, -24.22), x_dir=(-1, 0, 0), z_dir=(0, 0, -1))):
        Polygon((10.539999999999964, -3.3999999999999932), (16.339999999999996, -3.399999999999995), (16.339999999999996, 25.36691176470587), (10.53999999999996, 31.550735294117693), align=None)
    extrude(amount=-EXTRUDE_15_DEPTH)

    # 草图33 → 凸台-拉伸16 (add)
    with BuildSketch(Plane(origin=(9.040000000000003, 0, 0), x_dir=(0, 0, -1), z_dir=(1, 0, 0))):
        Polygon((5.26, -36.385), (5.26, -16.885), (-0.1, -3.3999999999999932), (-0.1, 21.640000000000015), (-1, 21.640000000000015), (-1, -3.3999999999999932), (4.359999999999999, -16.885), (4.359999999999999, -36.385), align=None)
        Polygon((-0.1, 31.670000000000012), (-0.1, 40.10000000000001), (24.22, 40.10000000000001), (24.22, 41.10000000000001), (-1, 41.10000000000001), (-1, 31.670000000000012), align=None)
    extrude(amount=EXTRUDE_16_DEPTH)

    # 草图34 → 切除-拉伸17 (cut)
    with BuildSketch(Plane.XY.offset(-4.359999999999999)):
        Polygon((10.040000000000004, -35.384999999999984), (9.040000000000003, -36.385), (10.040000000000004, -36.385), align=None)
    extrude(amount=-CUT_EXTRUDE_17_DEPTH, mode=Mode.SUBTRACT)

    # 草图36 → 切除-拉伸18 (cut)
    with BuildSketch(Plane.XY.offset(1)):
        with Locations((-0.4000000000000017, 2.460000000000012)):
            Circle(SKETCH_36_R)
    extrude(amount=-CUT_EXTRUDE_18_DEPTH, mode=Mode.SUBTRACT)

    # 草图37 → 凸台-拉伸17 (add)
    with SkipClean():  # the faces are left unmerged after this step: merging them gives an invalid solid
        with BuildSketch(Plane.XY.offset(1)):
            with BuildLine():
                ThreePointArc((0.9999999999999982, 2.4600000000000115), (0.8124355652982125, 1.7600000000000122), (0.29999999999999805, 1.2475644347017973))
                ThreePointArc((0.2999999999999984, 1.2475644347017978), (1.6999999999999982, 1.247564434701798), (2.3999999999999986, 2.460000000000012))
                ThreePointArc((2.3999999999999986, 2.460000000000012), (1.6999999999999988, 3.672435565298226), (0.29999999999999905, 3.6724355652982275))
                ThreePointArc((0.29999999999999805, 3.6724355652982266), (0.8124355652982123, 3.160000000000012), (0.9999999999999982, 2.460000000000012))
            make_face()
        extrude(amount=-EXTRUDE_17_DEPTH)

    # 草图40 → 切除-拉伸20 (cut)
    with SkipClean():  # the faces are left unmerged after this step: merging them gives an invalid solid
        with BuildSketch(Plane(origin=(0, 0, -24.22), x_dir=(-1, 0, 0), z_dir=(0, 0, -1)).offset(CUT_EXTRUDE_START_2)):
            with Locations((0.15490000207892152, -1.4990762577480474)):
                Rectangle(SKETCH_40_W, SKETCH_40_H)
        extrude(amount=CUT_EXTRUDE_20_DEPTH, mode=Mode.SUBTRACT)

    # 镜向1: part across plane


with BuildPart() as part_1:
    with SkipClean():  # the faces are left unmerged after this step: merging them gives an invalid solid
        add(part.part)
        add(part.part.mirror(Plane.XY.offset(-12.11)))

    # 草图41 → 切除-拉伸22 (cut)
    with SkipClean():  # the faces are left unmerged after this step: merging them gives an invalid solid
        with BuildSketch(Plane.XY.offset(-12.11)):
            with BuildLine():
                Line((10.040000000000004, 37.155000000000015), (2.305000000000005, 37.155000000000015))
                ThreePointArc((2.3050000000000055, 37.155000000000015), (6.529498334560102, 36.26767984597943), (10.039999999999905, 33.7556883469141))
                Line((10.040000000000004, 33.755688346914134), (10.040000000000004, 37.155000000000015))
            make_face()
            with BuildLine():
                ThreePointArc((10.039999999999905, 33.7556883469141), (6.529498334560102, 36.26767984597943), (2.3050000000000055, 37.155000000000015))
                Line((2.305000000000005, 37.155000000000015), (2.3050000000000055, 31.670000000000016))
                Line((2.3050000000000055, 31.670000000000012), (10.040000000000004, 31.670000000000012))
                Line((10.040000000000004, 31.670000000000012), (10.040000000000004, 33.755688346914134))
            make_face()
            with BuildLine():
                Line((2.3050000000000055, 31.670000000000016), (2.305000000000005, 37.155000000000015))
                ThreePointArc((2.3050000000000055, 37.155000000000015), (-5.1196212024587435, 34.07962120245876), (-8.194999999999995, 26.655000000000012))
                Line((-8.194999999999995, 26.655000000000012), (-2.7099999999999955, 26.655000000000012))
                ThreePointArc((-2.7099999999999955, 26.65499999999993), (-1.2411405076505608, 30.20114050765052), (2.3050000000000055, 31.670000000000016))
            make_face()
            with BuildLine():
                Line((-2.7099999999999955, 26.655000000000012), (-8.194999999999995, 26.655000000000012))
                ThreePointArc((-8.194999999999995, 26.655000000000012), (-5.11962120245862, 19.23037879754114), (2.3050000000003577, 16.155000000000012))
                Line((2.3050000000000064, 16.155000000000012), (2.305000000000006, 21.640000000000015))
                ThreePointArc((2.305000000000005, 21.640000000000015), (-1.2411405076505009, 23.10885949234945), (-2.7099999999999955, 26.65499999999993))
            make_face()
            with BuildLine():
                Line((2.3050000000000055, 31.670000000000016), (2.305000000000005, 37.155000000000015))
                ThreePointArc((2.3050000000000055, 37.155000000000015), (-5.1196212024587435, 34.07962120245876), (-8.194999999999995, 26.655000000000012))
                Line((-8.194999999999995, 26.655000000000012), (-2.7099999999999955, 26.655000000000012))
                ThreePointArc((-2.7099999999999955, 26.65499999999993), (-1.2411405076505608, 30.20114050765052), (2.3050000000000055, 31.670000000000016))
            make_face()
            with BuildLine():
                Line((-2.7099999999999955, 26.655000000000012), (-8.194999999999995, 26.655000000000012))
                ThreePointArc((-8.194999999999995, 26.655000000000012), (-5.11962120245862, 19.23037879754114), (2.3050000000003577, 16.155000000000012))
                Line((2.3050000000000064, 16.155000000000012), (2.305000000000006, 21.640000000000015))
                ThreePointArc((2.305000000000005, 21.640000000000015), (-1.2411405076505009, 23.10885949234945), (-2.7099999999999955, 26.65499999999993))
            make_face()
            with BuildLine():
                Line((2.305000000000006, 21.640000000000015), (2.3050000000000064, 16.155000000000012))
                ThreePointArc((2.3050000000003577, 16.155000000000012), (6.52949833456033, 17.04232015402069), (10.04000000000001, 19.55431165308604))
                Line((10.040000000000004, 19.55431165308604), (10.040000000000004, 21.640000000000015))
                Line((10.040000000000004, 21.640000000000015), (2.305000000000005, 21.640000000000015))
            make_face()
            with BuildLine():
                ThreePointArc((10.04000000000001, 19.55431165308604), (6.52949833456033, 17.04232015402069), (2.3050000000003577, 16.155000000000012))
                Line((2.3050000000000064, 16.155000000000012), (2.305000000000007, 10.155000000000015))
                Line((2.305000000000007, 10.155000000000015), (10.040000000000006, 10.155000000000015))
                Line((10.040000000000004, 10.155000000000015), (10.040000000000004, 19.55431165308604))
            make_face()
            with BuildLine():
                ThreePointArc((2.3050000000003577, 16.155000000000012), (-5.11962120245862, 19.23037879754114), (-8.194999999999995, 26.655000000000012))
                Line((-8.194999999999995, 26.655000000000012), (-8.194999999999993, 10.155000000000015))
                Line((-8.194999999999993, 10.155000000000015), (2.305000000000007, 10.155000000000015))
                Line((2.305000000000007, 10.155000000000015), (2.3050000000000064, 16.155000000000012))
            make_face()
        extrude(amount=CUT_EXTRUDE_22_DEPTH, mode=Mode.SUBTRACT)

    # 草图42 → 切除-拉伸23 (cut)
    with SkipClean():  # the faces are left unmerged after this step: merging them gives an invalid solid
        with BuildSketch(Plane(origin=(0, 0, -19.86), x_dir=(-1, 0, 0), z_dir=(0, 0, -1))):
            with Locations((-2.3249999999998776, -33.3850000000001)):
                Circle(SKETCH_42_R)
            with Locations((-2.3249999999998776, -33.3850000000001)):
                Circle(SKETCH_42_R_2, mode=Mode.SUBTRACT)
        extrude(amount=-CUT_EXTRUDE_23_DEPTH, mode=Mode.SUBTRACT)

    # 草图43 → 切除-拉伸24 (cut)
    with SkipClean():  # the faces are left unmerged after this step: merging them gives an invalid solid
        with BuildSketch(Plane.XY.offset(-4.359999999999999).offset(CUT_EXTRUDE_START_3)):
            with Locations(Location((2.3249999999998776, -33.3850000000001, 0), (0, 0, 180))):
                Circle(SKETCH_43_R)
        extrude(amount=CUT_EXTRUDE_24_DEPTH, mode=Mode.SUBTRACT)


solid = part_1.part
